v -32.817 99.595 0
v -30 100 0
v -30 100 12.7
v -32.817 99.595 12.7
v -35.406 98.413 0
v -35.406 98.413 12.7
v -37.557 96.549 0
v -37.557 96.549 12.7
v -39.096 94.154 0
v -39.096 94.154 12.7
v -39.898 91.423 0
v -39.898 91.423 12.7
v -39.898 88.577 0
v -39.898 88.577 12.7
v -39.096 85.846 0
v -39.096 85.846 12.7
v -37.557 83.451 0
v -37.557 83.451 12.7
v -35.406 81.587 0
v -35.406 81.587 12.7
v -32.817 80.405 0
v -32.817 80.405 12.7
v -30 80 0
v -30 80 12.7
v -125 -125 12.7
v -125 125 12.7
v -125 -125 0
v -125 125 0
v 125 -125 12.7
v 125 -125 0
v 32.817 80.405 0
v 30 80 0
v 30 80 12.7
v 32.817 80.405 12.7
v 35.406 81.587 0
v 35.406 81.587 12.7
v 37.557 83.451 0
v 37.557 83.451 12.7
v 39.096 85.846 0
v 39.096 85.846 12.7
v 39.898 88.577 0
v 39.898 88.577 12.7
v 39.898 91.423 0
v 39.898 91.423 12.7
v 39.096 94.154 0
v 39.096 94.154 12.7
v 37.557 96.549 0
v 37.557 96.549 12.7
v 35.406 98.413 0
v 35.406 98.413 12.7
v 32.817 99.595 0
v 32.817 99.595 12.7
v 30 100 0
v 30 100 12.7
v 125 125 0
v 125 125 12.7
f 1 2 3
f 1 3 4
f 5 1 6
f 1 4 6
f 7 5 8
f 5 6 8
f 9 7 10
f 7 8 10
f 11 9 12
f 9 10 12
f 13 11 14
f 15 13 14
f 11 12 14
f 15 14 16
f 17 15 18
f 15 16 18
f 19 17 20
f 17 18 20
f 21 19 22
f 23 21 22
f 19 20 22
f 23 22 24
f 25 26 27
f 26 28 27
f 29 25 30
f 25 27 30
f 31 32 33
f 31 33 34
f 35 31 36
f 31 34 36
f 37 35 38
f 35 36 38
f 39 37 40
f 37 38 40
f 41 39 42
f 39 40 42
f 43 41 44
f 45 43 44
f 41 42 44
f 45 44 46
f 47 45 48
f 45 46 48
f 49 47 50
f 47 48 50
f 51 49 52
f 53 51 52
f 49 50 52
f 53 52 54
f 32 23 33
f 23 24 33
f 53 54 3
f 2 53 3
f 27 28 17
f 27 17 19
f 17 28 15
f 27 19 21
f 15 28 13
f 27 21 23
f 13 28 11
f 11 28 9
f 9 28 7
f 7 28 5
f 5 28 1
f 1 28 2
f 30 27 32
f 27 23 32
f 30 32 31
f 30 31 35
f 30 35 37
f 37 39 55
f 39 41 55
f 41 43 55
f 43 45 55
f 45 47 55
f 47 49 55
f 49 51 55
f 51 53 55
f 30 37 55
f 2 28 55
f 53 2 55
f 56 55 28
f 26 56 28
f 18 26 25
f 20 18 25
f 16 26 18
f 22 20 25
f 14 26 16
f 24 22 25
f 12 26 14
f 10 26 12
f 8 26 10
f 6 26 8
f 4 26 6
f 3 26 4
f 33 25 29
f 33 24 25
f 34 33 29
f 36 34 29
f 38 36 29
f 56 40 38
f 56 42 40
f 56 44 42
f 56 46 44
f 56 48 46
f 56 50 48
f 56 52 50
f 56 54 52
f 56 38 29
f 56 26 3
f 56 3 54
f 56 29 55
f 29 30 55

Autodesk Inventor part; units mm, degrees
ref_plane "YZ Plane" through (0, 0, 0) normal (1, 0, 0) x (0, 1, 0)
ref_plane "XZ Plane" through (0, 0, 0) normal (0, 1, 0) x (-1, 0, 0)
ref_plane "XY Plane" through (0, 0, 0) normal (0, 0, 1) x (1, 0, 0)
sketch "Sketch1" plane through (0, 0, 0) normal (0, 0, 1) x (1, 0, 0)
  line L0 (-125, -125) -> (125, -125)
  line L1 (125, -125) -> (125, 125)
  line L2 (125, 125) -> (-125, 125)
  line L3 (-125, 125) -> (-125, -125)
  line L4 (-125, -125) -> (125, 125) construction
  line L5 (125, -125) -> (-125, 125) construction
  point P0 (0, 0)
  dimension "Height" = 250
  dimension "Width" = 250
extrude "Extrusion1" add sketch "Sketch1" along normal blind 12.7
sketch "Sketch2" plane through (0, 0, 12.7) normal (0, 0, 1) x (1, 0, 0)
  line L0 (-30, 90) -> (30, 90) construction
  line L1 (-30, 80) -> (30, 80)
  line L2 (30, 100) -> (-30, 100)
  arc A0 (-30, 100) -> (-30, 80) centre (-30, 90) ccw
  arc A1 (30, 80) -> (30, 100) centre (30, 90) ccw
  line L3 (125, 125) -> (-125, 125) projected
  point P0 (0, 0)
  point P1 (0, 90)
  dimension "d4" = 30
  dimension "d5" = 20
  dimension "d6" = 25
extrude "Extrusion2" cut sketch "Sketch2" against normal up to surface (12.7 mm away)
equation "\"d7\" = thickness"
equation "\"thickness\" = 12.7"
properties part number "Creat Front-02" material "Wood (Maple)"
